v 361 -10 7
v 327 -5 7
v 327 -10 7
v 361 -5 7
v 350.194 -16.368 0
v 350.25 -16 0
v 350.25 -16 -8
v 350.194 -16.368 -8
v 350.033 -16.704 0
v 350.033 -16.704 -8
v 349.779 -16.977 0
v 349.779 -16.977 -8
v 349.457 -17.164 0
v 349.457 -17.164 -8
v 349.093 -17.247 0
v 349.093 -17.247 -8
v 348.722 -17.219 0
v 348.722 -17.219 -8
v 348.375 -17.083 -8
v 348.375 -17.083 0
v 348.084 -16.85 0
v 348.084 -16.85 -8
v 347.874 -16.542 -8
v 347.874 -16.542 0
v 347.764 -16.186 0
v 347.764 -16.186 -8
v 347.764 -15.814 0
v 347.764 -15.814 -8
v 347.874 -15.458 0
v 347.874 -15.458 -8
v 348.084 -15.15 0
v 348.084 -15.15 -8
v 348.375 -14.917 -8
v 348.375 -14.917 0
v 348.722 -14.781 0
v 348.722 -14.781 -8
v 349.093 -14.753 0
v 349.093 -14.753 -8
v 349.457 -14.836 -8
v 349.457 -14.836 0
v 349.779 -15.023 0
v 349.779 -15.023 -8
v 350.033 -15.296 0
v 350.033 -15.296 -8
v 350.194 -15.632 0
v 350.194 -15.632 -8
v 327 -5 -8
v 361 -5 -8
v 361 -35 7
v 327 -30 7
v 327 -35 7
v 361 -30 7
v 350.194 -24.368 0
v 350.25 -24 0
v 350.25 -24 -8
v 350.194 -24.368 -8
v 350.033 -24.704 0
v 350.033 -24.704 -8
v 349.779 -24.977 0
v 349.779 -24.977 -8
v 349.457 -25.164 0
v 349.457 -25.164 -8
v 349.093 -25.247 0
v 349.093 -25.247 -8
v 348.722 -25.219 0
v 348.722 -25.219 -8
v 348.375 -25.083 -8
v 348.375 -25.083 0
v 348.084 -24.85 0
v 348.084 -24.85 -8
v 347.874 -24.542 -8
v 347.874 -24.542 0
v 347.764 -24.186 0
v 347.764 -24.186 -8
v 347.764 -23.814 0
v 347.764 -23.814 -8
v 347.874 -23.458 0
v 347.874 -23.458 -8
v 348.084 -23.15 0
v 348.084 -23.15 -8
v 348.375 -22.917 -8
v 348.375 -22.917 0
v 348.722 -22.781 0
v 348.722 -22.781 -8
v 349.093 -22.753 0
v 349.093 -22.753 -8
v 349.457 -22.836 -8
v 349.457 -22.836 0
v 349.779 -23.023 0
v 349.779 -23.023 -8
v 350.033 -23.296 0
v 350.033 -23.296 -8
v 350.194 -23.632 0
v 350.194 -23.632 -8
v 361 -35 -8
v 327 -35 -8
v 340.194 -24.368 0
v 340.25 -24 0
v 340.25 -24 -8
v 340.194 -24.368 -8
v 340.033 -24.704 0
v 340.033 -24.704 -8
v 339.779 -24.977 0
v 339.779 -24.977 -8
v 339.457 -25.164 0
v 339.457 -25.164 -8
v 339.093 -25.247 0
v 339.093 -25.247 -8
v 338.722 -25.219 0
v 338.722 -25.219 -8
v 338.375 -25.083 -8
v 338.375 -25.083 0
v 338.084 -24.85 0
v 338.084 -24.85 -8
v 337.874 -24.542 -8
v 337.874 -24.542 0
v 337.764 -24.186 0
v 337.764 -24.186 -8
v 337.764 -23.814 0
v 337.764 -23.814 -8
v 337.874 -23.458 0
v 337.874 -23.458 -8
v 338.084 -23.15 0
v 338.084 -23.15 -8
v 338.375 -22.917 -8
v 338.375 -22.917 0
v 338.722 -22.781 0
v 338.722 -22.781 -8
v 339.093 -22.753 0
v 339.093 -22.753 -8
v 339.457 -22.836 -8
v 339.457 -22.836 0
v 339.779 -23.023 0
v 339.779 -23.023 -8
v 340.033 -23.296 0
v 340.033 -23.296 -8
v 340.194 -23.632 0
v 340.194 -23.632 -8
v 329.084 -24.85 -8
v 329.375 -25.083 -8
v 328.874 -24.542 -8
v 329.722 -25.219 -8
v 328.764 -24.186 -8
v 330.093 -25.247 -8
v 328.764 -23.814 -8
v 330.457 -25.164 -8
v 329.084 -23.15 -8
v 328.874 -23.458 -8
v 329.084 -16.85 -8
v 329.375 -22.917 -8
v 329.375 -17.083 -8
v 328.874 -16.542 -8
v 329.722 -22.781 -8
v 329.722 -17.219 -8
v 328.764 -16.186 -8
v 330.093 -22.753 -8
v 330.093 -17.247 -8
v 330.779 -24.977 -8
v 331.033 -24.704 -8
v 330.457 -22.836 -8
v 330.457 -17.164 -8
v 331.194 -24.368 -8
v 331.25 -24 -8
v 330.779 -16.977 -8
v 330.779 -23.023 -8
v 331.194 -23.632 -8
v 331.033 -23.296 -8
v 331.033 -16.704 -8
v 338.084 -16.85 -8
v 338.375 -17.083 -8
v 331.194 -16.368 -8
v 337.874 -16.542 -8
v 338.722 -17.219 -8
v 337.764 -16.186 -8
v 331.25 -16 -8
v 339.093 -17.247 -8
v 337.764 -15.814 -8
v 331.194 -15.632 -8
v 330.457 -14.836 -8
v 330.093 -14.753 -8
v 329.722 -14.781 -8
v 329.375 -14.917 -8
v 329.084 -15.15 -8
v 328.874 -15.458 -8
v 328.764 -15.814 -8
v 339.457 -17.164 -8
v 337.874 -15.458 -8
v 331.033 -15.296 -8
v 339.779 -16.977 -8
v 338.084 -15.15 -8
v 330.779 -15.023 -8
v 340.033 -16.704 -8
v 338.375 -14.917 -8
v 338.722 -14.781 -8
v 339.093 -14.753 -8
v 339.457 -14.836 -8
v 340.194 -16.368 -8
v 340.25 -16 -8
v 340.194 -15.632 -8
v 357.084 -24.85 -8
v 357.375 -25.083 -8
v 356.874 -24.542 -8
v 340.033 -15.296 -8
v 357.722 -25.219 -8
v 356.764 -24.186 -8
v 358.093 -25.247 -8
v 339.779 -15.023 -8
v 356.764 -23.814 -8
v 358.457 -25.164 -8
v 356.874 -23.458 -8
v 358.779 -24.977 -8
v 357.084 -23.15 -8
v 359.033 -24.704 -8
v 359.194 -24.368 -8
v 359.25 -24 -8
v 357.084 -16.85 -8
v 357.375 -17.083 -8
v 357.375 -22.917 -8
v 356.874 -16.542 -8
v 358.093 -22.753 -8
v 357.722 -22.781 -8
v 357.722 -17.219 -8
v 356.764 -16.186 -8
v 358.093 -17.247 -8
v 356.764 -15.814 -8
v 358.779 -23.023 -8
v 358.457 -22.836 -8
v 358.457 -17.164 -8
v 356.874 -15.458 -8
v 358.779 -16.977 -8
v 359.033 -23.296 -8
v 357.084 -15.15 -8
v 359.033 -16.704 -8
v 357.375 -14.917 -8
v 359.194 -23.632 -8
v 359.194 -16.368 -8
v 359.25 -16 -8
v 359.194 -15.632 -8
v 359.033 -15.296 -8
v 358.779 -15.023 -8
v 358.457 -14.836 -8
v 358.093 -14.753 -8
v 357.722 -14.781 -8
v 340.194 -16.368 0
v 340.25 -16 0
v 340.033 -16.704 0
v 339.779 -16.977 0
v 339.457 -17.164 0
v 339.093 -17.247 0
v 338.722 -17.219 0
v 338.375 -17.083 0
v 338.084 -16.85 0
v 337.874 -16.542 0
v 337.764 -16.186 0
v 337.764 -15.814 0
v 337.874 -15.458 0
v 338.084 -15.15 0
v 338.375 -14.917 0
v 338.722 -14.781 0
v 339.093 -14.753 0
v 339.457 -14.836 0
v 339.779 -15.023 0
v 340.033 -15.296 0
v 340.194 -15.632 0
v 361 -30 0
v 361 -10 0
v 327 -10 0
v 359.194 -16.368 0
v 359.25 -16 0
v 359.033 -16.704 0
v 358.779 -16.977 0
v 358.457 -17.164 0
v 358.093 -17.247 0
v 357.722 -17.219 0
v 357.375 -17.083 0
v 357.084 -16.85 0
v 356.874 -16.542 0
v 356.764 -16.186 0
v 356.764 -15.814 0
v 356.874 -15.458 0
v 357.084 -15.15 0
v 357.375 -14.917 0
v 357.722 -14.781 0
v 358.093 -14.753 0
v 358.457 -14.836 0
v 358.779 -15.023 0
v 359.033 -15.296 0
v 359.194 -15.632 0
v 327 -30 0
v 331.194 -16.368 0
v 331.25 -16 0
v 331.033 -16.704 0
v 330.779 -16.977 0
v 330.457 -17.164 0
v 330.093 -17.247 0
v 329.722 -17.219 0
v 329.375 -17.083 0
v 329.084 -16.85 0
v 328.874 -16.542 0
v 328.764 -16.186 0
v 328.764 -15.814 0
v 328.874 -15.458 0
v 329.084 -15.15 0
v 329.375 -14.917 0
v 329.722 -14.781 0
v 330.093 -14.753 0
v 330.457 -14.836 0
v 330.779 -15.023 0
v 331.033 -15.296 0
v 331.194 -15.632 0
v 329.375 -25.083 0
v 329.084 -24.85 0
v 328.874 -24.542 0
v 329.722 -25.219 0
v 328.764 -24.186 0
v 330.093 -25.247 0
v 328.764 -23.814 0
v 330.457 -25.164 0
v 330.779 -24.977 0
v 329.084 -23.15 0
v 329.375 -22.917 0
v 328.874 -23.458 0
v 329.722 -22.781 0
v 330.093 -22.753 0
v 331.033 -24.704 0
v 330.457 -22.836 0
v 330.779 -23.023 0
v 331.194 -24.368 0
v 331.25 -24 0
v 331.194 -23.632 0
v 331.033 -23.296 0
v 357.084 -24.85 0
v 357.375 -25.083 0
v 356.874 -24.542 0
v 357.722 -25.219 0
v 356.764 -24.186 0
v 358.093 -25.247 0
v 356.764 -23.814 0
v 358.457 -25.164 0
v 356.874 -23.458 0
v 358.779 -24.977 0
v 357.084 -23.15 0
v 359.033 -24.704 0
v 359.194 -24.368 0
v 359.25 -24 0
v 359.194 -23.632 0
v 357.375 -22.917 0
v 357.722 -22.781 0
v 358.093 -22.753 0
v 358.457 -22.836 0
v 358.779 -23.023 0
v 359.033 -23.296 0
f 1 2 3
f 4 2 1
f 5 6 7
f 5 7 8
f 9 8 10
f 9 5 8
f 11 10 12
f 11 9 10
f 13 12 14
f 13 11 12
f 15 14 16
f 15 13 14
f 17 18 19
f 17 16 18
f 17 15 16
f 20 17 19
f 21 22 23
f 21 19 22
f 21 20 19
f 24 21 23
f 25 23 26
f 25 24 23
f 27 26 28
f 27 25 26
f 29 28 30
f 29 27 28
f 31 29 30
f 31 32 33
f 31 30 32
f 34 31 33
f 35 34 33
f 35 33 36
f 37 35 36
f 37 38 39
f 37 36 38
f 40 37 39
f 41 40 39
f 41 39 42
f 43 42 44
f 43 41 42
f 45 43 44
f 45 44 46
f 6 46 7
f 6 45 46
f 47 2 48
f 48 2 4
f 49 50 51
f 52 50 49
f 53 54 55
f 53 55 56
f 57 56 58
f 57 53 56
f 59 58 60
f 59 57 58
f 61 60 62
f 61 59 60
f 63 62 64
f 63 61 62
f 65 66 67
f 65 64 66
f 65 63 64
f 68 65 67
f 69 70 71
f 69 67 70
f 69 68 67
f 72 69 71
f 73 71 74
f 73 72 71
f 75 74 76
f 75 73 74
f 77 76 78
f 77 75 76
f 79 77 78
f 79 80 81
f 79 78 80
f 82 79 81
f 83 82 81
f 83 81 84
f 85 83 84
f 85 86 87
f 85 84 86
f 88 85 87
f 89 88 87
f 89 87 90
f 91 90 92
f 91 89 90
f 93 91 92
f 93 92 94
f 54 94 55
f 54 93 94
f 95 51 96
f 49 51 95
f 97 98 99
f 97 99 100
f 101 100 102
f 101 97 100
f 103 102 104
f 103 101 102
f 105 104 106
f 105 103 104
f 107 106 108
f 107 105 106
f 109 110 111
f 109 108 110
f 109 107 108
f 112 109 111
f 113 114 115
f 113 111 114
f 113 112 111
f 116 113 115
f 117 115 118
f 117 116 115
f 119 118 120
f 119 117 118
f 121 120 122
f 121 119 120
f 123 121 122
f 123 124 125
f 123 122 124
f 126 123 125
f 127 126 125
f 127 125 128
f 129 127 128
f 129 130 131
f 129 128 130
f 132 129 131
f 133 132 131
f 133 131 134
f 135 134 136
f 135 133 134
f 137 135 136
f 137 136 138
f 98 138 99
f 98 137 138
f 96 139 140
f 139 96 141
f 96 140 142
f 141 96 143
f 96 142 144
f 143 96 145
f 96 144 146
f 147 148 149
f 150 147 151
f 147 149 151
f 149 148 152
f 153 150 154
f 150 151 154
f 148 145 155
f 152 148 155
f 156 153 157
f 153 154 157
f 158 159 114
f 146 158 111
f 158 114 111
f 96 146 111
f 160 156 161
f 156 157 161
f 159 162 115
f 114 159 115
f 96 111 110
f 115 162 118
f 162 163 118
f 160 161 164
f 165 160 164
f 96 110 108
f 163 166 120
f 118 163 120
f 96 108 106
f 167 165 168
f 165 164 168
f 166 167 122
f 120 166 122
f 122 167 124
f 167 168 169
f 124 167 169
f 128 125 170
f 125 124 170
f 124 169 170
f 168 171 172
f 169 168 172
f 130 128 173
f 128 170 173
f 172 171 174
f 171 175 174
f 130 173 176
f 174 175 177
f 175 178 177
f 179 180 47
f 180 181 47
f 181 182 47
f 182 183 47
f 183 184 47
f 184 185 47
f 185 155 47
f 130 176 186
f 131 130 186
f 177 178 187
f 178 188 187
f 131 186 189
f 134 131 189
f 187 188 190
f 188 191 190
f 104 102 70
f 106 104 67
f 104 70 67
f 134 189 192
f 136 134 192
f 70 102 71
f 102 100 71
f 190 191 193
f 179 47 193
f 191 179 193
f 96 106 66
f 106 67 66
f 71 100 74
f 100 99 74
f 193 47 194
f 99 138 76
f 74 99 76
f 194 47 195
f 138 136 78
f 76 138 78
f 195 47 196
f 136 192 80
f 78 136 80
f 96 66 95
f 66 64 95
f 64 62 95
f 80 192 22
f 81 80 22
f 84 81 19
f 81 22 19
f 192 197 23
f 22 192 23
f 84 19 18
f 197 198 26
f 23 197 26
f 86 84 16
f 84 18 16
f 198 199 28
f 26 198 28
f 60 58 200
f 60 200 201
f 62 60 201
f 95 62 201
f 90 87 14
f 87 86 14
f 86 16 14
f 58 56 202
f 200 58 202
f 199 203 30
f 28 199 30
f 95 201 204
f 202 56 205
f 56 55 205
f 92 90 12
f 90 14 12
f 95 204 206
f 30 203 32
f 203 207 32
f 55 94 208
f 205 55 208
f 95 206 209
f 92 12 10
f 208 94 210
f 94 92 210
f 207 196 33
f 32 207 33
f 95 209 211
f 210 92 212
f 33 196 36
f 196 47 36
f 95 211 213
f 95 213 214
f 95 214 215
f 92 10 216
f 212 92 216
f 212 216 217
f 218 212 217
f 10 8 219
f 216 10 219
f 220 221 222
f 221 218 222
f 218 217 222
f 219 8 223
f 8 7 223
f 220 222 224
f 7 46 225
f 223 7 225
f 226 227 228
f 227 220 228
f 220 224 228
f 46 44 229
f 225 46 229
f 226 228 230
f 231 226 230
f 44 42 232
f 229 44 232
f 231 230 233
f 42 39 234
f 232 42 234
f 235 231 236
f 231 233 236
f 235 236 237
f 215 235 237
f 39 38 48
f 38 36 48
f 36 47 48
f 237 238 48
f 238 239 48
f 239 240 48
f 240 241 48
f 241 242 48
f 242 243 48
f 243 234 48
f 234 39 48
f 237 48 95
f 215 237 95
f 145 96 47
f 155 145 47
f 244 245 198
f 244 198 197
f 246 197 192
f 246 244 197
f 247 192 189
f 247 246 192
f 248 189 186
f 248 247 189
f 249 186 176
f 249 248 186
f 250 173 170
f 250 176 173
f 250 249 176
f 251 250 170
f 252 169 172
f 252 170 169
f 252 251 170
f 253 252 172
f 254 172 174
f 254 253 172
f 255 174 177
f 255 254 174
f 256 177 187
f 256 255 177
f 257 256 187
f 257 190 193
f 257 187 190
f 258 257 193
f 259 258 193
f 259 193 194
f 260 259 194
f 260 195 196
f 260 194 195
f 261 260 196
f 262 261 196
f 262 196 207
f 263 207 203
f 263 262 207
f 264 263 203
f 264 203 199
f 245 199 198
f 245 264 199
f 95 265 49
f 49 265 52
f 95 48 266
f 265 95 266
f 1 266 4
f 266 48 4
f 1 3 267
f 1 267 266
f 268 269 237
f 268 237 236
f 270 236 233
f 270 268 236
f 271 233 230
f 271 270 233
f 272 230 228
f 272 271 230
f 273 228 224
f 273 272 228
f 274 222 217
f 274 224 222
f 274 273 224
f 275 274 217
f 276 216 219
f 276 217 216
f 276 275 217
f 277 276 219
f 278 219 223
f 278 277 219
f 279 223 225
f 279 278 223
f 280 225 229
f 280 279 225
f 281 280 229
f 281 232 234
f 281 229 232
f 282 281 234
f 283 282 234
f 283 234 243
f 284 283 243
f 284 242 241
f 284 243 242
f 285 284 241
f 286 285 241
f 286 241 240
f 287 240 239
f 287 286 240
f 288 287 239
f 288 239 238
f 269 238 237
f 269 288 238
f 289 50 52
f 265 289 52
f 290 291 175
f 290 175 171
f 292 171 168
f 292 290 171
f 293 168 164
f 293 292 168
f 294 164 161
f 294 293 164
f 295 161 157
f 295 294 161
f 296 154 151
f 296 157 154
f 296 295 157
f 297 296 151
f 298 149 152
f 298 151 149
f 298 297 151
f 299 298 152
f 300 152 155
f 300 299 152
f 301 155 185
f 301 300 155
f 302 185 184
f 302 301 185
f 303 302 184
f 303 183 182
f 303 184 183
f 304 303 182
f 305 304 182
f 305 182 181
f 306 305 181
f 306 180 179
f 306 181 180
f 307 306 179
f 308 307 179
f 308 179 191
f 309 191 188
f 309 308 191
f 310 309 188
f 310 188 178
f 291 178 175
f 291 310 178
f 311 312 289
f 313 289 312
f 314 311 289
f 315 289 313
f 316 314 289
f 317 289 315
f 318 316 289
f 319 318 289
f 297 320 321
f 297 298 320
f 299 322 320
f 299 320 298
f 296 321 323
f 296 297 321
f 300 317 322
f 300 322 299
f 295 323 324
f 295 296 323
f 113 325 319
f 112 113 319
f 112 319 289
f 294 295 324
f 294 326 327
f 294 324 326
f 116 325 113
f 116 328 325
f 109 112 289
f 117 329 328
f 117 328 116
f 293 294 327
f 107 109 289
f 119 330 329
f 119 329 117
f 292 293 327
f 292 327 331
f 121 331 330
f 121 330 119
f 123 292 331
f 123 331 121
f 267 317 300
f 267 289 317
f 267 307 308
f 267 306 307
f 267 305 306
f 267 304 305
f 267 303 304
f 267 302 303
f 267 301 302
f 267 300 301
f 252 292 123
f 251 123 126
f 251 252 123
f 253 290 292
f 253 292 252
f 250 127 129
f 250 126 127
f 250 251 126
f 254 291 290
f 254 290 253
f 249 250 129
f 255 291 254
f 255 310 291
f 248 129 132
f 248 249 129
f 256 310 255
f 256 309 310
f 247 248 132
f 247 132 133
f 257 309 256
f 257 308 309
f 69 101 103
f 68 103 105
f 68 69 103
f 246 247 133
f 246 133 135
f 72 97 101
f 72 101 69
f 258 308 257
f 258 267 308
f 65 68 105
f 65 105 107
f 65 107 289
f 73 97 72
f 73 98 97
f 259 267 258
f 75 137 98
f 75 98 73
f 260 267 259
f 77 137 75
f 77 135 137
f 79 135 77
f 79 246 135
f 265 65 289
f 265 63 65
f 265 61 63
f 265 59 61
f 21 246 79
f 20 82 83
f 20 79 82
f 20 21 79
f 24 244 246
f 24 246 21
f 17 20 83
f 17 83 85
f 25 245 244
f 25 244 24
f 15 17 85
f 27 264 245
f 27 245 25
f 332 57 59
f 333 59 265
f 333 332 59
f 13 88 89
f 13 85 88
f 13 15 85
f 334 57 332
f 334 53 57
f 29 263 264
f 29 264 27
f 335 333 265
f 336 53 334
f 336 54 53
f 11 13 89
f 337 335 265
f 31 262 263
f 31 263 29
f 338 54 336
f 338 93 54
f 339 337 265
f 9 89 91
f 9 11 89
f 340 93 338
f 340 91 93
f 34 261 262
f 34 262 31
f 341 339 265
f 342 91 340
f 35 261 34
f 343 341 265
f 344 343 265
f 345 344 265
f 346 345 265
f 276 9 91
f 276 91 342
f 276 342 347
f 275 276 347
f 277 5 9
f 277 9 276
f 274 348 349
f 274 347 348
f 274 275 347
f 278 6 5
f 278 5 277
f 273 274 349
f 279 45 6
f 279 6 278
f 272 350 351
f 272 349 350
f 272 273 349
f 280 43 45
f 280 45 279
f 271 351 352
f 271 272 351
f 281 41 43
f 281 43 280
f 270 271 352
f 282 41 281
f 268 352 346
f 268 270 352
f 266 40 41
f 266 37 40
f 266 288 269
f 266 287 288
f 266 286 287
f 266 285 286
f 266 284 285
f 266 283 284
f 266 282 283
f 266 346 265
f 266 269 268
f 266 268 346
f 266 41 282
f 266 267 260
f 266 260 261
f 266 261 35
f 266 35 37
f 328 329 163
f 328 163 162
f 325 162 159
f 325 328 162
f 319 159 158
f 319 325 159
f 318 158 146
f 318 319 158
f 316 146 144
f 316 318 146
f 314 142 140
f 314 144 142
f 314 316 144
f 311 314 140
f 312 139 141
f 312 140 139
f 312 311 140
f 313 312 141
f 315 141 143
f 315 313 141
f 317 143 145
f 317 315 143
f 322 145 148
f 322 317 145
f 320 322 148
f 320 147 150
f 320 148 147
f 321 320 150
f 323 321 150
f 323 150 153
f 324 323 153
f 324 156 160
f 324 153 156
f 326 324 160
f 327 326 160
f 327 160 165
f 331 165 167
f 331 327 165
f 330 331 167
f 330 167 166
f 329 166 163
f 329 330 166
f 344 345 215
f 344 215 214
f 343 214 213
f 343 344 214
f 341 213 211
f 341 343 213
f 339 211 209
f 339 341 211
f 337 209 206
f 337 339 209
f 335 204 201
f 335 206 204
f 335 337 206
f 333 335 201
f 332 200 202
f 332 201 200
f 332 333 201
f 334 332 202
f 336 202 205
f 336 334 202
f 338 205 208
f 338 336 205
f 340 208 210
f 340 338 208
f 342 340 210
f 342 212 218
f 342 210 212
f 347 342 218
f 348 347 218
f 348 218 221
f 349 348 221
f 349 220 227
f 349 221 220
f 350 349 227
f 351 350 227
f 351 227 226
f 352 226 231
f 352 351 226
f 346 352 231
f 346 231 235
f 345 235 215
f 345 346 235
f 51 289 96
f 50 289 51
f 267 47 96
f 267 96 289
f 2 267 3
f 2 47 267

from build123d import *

# Parameters (mm, degrees)
CYLINDER065_R          = 1.25
CYLINDER065_DEPTH      = 10
CYLINDER066_R          = 1.25
CYLINDER066_DEPTH      = 10
CYLINDER067_R          = 1.25
CYLINDER067_DEPTH      = 10
CYLINDER068_R          = 1.25
CYLINDER068_DEPTH      = 10
CYLINDER070_R          = 1.25
CYLINDER070_DEPTH      = 10
CYLINDER069_R          = 1.25
CYLINDER069_DEPTH      = 10
CYLINDER063_R          = 1.25
CYLINDER063_DEPTH      = 10
CYLINDER064_R          = 1.25
CYLINDER064_DEPTH      = 10
BOX028_W               = 34
BOX028_H               = 8
BOX028_DEPTH           = 20
BOX029_W               = 34
BOX029_H               = 15
BOX029_DEPTH           = 5
BOX027_W               = 34
BOX027_H               = 15
BOX027_DEPTH           = 5
CUT031_PLACEMENT_ANGLE = 90


with BuildPart() as cylinder065:
    # Cylinder065 → Cylinder065 (new body)
    with BuildSketch(Plane(origin=(87.5, 61, 14), x_dir=(1, 0, 0), z_dir=(0, -1, 0))):
        Circle(CYLINDER065_R)
    extrude(amount=CYLINDER065_DEPTH)


with BuildPart() as cylinder066:
    # Cylinder066 → Cylinder066 (new body)
    with BuildSketch(Plane(origin=(87.5, 11, 14), x_dir=(1, 0, 0), z_dir=(0, -1, 0))):
        Circle(CYLINDER066_R)
    extrude(amount=CYLINDER066_DEPTH)


with BuildPart() as fusion056:
    # Fusion056 base: copy of Cylinder066
    add(cylinder066.part)

    # Fusion056: union Cylinder065
    add(cylinder065.part)


with BuildPart() as fusion056_1:
    # Fusion056 placement: moved
    add(fusion056.part.moved(Location((251.5, 0, 0))))


with BuildPart() as cylinder067:
    # Cylinder067 → Cylinder067 (new body)
    with BuildSketch(Plane(origin=(87.5, 61, 14), x_dir=(1, 0, 0), z_dir=(0, -1, 0))):
        Circle(CYLINDER067_R)
    extrude(amount=CYLINDER067_DEPTH)


with BuildPart() as cylinder068:
    # Cylinder068 → Cylinder068 (new body)
    with BuildSketch(Plane(origin=(87.5, 11, 14), x_dir=(1, 0, 0), z_dir=(0, -1, 0))):
        Circle(CYLINDER068_R)
    extrude(amount=CYLINDER068_DEPTH)


with BuildPart() as fusion057:
    # Fusion057 base: copy of Cylinder068
    add(cylinder068.part)

    # Fusion057: union Cylinder067
    add(cylinder067.part)


with BuildPart() as fusion057_1:
    # Fusion057 placement: moved
    add(fusion057.part.moved(Location((261.5, 0, 0))))


with BuildPart() as cylinder070:
    # Cylinder070 → Cylinder070 (new body)
    with BuildSketch(Plane(origin=(87.5, 61, 14), x_dir=(1, 0, 0), z_dir=(0, -1, 0))):
        Circle(CYLINDER070_R)
    extrude(amount=CYLINDER070_DEPTH)


with BuildPart() as cylinder069:
    # Cylinder069 → Cylinder069 (new body)
    with BuildSketch(Plane(origin=(87.5, 11, 14), x_dir=(1, 0, 0), z_dir=(0, -1, 0))):
        Circle(CYLINDER069_R)
    extrude(amount=CYLINDER069_DEPTH)


with BuildPart() as fusion055:
    # Fusion055 base: copy of Cylinder069
    add(cylinder069.part)

    # Fusion055: union Cylinder070
    add(cylinder070.part)


with BuildPart() as fusion055_1:
    # Fusion055 placement: moved
    add(fusion055.part.moved(Location((270.5, 0, 0))))


with BuildPart() as cylinder063:
    # Cylinder063 → Cylinder063 (new body)
    with BuildSketch(Plane(origin=(87.5, 61, 14), x_dir=(1, 0, 0), z_dir=(0, -1, 0))):
        Circle(CYLINDER063_R)
    extrude(amount=CYLINDER063_DEPTH)


with BuildPart() as cylinder064:
    # Cylinder064 → Cylinder064 (new body)
    with BuildSketch(Plane(origin=(87.5, 11, 14), x_dir=(1, 0, 0), z_dir=(0, -1, 0))):
        Circle(CYLINDER064_R)
    extrude(amount=CYLINDER064_DEPTH)


with BuildPart() as fusion065:
    # Fusion058 base: copy of Cylinder064
    add(cylinder064.part)

    # Fusion058: union Cylinder063
    add(cylinder063.part)


with BuildPart() as fusion065_1:
    # Fusion058 placement: moved
    add(fusion065.part.moved(Location((242.5, 0, 0))))

    # Fusion065: union Fusion056, Fusion057, Fusion055
    add(fusion056_1.part)
    add(fusion057_1.part)
    add(fusion055_1.part)


with BuildPart() as fusion065_2:
    # Fusion065 placement: moved
    add(fusion065_1.part.moved(Location((0, 0, -8))))


with BuildPart() as fusion050:
    # Fusion050 base: copy of Cylinder066
    add(cylinder066.part)

    # Fusion050: union Cylinder065
    add(cylinder065.part)


with BuildPart() as fusion050_1:
    # Fusion050 placement: moved
    add(fusion050.part.moved(Location((251.5, 0, 0))))


with BuildPart() as fusion051:
    # Fusion051 base: copy of Cylinder068
    add(cylinder068.part)

    # Fusion051: union Cylinder067
    add(cylinder067.part)


with BuildPart() as fusion051_1:
    # Fusion051 placement: moved
    add(fusion051.part.moved(Location((261.5, 0, 0))))


with BuildPart() as fusion052:
    # Fusion052 base: copy of Cylinder069
    add(cylinder069.part)

    # Fusion052: union Cylinder070
    add(cylinder070.part)


with BuildPart() as fusion052_1:
    # Fusion052 placement: moved
    add(fusion052.part.moved(Location((270.5, 0, 0))))


with BuildPart() as fusion063:
    # Fusion049 base: copy of Cylinder064
    add(cylinder064.part)

    # Fusion049: union Cylinder063
    add(cylinder063.part)


with BuildPart() as fusion063_1:
    # Fusion049 placement: moved
    add(fusion063.part.moved(Location((242.5, 0, 0))))

    # Fusion064: union Fusion050, Fusion051, Fusion052
    add(fusion050_1.part)
    add(fusion051_1.part)
    add(fusion052_1.part)

    # Fusion063: union Fusion065
    add(fusion065_2.part)


with BuildPart() as fusion063_2:
    # Fusion063 placement: moved
    add(fusion063_1.part.moved(Location((0, -10, 0))))


with BuildPart() as cube007:
    # Box028 → Box028 (new body)
    with BuildSketch(Plane(origin=(0, -10, 0), x_dir=(1, 0, 0), z_dir=(0, 0, 1))):
        with Locations((17, 4)):
            Rectangle(BOX028_W, BOX028_H)
    extrude(amount=BOX028_DEPTH)


with BuildPart() as cube008:
    # Box029 → Box029 (new body)
    with BuildSketch(Plane(origin=(0, -10, 20), x_dir=(1, 0, 0), z_dir=(0, 0, 1))):
        with Locations((17, 7.5)):
            Rectangle(BOX029_W, BOX029_H)
    extrude(amount=BOX029_DEPTH)


with BuildPart() as cut031:
    # Box027 → Box027 (new body)
    with BuildSketch(Plane(origin=(0, -10, -5), x_dir=(1, 0, 0), z_dir=(0, 0, 1))):
        with Locations((17, 7.5)):
            Rectangle(BOX027_W, BOX027_H)
    extrude(amount=BOX027_DEPTH)

    # Fusion067: union Cube007, Cube008
    add(cube007.part)
    add(cube008.part)


with BuildPart() as cut031_1:
    # Fusion067 placement: moved
    add(cut031.part.moved(Location((327, 2, 0))))

    # Cut031: cut Fusion063
    add(fusion063_2.part, mode=Mode.SUBTRACT)


with BuildPart() as cut031_2:
    # Cut031 placement: moved
    add(cut031_1.part.moved(Location((0, -10, 0))).rotate(Axis((0, -10, 0), (1, 0, 0)), CUT031_PLACEMENT_ANGLE))


solid = cut031_2.part
